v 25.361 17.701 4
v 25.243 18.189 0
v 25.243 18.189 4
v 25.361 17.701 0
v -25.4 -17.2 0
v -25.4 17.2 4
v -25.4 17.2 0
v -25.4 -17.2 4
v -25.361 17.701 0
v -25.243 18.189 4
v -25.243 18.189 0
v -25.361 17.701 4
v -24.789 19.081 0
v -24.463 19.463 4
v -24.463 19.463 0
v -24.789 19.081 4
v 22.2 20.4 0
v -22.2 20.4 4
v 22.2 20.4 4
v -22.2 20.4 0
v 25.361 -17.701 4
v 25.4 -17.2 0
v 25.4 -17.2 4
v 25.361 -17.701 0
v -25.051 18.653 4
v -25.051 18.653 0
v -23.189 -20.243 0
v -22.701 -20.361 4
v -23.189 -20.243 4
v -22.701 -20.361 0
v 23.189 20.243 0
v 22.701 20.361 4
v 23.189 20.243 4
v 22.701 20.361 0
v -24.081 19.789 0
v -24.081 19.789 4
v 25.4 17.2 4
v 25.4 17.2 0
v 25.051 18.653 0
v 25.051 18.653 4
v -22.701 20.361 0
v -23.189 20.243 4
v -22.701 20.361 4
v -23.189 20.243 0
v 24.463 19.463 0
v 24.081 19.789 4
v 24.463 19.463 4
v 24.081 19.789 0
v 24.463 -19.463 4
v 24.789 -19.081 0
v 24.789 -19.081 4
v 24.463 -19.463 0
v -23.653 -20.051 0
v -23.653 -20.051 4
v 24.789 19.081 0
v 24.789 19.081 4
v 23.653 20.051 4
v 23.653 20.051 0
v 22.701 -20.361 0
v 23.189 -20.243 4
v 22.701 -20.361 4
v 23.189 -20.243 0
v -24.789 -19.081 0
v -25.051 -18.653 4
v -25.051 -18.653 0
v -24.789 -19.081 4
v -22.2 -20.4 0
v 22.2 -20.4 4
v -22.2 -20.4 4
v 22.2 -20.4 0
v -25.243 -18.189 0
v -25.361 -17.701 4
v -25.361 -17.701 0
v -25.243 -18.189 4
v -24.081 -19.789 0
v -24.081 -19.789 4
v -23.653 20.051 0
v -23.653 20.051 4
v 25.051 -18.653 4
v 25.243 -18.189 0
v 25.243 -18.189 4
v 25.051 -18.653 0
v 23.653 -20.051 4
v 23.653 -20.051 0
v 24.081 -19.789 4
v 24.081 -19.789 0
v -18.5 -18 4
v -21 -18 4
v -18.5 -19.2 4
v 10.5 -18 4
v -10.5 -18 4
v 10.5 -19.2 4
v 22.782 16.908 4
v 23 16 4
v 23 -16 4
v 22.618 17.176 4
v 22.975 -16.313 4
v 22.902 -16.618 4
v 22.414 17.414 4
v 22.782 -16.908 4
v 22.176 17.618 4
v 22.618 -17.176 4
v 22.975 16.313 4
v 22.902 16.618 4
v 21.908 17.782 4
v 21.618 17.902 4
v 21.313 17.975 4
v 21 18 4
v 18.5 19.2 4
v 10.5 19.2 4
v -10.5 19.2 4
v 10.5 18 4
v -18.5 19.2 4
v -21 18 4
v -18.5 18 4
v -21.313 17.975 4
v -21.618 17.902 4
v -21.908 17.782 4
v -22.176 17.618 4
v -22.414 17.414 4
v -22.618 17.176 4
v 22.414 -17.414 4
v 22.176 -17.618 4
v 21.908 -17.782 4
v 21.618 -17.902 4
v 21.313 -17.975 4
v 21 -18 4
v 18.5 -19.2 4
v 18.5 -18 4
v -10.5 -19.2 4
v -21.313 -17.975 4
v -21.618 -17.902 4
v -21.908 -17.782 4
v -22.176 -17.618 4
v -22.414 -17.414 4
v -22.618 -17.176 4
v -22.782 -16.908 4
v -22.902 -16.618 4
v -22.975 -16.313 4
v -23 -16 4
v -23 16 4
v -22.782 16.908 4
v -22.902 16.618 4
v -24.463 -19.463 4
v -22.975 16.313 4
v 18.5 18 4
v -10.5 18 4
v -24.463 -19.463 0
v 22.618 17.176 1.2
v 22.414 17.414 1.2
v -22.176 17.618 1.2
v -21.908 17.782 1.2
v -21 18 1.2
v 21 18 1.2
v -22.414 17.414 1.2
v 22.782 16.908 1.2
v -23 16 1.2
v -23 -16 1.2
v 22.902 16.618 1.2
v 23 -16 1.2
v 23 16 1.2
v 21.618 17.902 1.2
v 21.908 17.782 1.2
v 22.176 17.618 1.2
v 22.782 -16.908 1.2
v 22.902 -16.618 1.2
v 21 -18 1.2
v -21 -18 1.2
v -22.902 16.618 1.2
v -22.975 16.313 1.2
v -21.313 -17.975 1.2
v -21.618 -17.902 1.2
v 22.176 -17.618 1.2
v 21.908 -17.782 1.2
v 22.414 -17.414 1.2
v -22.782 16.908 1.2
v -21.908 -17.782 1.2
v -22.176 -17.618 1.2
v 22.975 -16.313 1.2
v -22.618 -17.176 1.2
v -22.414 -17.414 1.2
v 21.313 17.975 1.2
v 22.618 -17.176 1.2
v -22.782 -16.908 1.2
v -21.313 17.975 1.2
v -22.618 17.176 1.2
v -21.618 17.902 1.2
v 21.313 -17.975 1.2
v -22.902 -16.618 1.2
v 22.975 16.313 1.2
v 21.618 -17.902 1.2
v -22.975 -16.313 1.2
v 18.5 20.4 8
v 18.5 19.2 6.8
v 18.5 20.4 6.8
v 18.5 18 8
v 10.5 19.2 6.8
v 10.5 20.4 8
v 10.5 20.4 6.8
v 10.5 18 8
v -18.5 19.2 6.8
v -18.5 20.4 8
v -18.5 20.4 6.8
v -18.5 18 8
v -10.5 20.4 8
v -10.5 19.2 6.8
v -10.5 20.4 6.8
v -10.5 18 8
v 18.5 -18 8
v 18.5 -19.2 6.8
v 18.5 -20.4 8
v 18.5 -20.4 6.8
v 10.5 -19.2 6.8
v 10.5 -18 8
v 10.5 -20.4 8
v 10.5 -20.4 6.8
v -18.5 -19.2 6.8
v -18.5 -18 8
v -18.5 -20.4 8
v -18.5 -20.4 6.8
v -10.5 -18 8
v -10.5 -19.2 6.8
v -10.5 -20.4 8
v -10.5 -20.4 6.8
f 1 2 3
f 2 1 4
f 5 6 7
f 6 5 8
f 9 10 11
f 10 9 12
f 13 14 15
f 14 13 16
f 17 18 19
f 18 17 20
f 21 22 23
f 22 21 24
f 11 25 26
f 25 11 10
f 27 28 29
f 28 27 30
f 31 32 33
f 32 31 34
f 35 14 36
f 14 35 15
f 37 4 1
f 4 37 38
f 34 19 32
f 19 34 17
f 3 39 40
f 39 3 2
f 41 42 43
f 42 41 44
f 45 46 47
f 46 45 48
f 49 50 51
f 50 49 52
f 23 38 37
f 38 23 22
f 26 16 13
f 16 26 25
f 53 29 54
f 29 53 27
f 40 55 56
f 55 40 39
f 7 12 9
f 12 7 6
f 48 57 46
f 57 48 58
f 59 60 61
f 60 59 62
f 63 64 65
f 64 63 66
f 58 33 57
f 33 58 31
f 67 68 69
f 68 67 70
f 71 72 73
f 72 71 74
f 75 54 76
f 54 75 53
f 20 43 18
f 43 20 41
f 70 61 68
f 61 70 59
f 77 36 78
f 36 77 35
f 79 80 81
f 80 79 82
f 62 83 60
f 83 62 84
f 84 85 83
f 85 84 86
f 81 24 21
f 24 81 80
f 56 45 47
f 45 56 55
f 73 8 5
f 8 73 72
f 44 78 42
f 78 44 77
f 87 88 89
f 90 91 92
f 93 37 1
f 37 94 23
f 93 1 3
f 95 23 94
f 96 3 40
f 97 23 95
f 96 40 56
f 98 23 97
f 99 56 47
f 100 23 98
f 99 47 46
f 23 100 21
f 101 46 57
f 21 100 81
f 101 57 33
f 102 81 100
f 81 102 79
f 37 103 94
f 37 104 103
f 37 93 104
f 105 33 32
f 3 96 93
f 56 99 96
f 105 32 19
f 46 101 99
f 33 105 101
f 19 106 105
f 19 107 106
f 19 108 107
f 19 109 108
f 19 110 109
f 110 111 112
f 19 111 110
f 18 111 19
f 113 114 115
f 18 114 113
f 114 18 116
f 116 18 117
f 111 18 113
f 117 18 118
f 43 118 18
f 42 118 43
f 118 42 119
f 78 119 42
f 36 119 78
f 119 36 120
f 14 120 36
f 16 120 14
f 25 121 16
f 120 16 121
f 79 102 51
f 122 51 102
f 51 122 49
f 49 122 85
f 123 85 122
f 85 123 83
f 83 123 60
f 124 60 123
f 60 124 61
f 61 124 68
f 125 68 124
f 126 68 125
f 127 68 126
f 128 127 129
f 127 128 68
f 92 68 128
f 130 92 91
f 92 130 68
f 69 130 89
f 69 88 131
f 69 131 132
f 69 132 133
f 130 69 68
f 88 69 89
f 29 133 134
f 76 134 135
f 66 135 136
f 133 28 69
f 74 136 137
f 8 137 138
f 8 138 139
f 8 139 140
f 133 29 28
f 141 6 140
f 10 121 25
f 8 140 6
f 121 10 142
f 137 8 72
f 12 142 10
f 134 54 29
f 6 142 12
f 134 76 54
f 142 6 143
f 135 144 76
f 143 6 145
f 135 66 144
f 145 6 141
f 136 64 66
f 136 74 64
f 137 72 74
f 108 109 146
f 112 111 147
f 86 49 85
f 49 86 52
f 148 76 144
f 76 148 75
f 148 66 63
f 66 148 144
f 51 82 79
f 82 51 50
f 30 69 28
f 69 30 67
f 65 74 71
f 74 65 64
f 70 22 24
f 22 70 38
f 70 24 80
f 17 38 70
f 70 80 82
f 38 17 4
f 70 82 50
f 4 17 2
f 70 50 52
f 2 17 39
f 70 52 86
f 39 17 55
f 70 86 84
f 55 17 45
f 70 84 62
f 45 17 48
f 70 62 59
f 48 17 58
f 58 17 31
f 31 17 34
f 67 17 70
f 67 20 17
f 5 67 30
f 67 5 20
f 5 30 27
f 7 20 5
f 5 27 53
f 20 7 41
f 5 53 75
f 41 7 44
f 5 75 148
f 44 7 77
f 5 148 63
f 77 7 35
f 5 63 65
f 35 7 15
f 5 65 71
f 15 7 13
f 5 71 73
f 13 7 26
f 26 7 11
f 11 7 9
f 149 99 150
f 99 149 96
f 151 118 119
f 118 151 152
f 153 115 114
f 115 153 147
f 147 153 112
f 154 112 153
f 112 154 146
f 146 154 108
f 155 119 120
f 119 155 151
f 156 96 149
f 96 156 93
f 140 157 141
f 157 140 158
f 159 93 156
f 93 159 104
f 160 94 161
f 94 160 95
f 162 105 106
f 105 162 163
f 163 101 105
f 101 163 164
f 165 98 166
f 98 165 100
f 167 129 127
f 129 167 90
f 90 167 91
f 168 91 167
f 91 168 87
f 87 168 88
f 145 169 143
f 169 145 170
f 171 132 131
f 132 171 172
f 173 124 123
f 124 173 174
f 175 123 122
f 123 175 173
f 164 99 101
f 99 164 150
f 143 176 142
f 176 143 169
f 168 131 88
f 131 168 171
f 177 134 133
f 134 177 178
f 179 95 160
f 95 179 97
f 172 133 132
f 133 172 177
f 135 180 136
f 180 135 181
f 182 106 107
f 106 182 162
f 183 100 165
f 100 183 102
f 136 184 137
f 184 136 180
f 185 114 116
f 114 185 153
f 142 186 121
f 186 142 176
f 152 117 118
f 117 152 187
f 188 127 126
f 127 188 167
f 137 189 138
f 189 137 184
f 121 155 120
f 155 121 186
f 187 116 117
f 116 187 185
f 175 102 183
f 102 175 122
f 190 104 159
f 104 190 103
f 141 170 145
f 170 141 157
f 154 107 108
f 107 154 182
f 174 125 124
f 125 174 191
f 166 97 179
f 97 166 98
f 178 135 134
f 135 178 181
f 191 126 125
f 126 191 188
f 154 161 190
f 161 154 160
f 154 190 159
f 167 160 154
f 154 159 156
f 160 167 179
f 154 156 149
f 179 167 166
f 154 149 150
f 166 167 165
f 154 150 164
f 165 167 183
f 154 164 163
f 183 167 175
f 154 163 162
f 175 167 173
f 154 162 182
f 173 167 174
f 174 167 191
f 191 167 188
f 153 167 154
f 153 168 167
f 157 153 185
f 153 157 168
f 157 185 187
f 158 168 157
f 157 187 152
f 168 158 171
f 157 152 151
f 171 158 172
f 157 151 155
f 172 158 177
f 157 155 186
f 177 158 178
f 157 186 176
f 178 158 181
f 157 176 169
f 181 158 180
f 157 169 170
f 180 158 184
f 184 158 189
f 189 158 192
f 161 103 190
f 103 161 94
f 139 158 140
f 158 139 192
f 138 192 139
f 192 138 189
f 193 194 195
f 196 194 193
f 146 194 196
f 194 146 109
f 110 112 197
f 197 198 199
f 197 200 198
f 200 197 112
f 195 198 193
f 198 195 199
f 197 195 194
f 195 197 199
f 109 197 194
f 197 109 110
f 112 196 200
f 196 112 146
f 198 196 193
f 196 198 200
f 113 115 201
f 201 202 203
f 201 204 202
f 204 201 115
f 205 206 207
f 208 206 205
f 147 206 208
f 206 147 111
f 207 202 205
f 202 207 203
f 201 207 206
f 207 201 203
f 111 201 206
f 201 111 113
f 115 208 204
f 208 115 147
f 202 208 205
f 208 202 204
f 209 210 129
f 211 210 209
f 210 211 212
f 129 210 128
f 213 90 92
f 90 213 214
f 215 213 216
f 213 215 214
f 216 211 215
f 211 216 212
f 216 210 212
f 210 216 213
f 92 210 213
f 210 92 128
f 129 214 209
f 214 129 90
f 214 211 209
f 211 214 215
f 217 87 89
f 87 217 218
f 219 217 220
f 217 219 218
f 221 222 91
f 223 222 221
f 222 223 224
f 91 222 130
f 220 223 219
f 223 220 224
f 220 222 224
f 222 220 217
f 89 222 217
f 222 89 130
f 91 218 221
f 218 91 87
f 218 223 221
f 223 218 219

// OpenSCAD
$fn=40;
module shell(dw,dl,h) {
    l = dl/2;
    w = dw/2;
    ol = l+th;
    ow = w+th;
    difference() {
        hull() {
            translate([-ow,-ol,0]) cylinder(h,o_fil,o_fil);
            translate([-ow,ol,0]) cylinder(h,o_fil,o_fil);
            translate([ow,-ol,0]) cylinder(h,o_fil,o_fil);
            translate([ow,ol,0]) cylinder(h,o_fil,o_fil);
        }
        hull() {
            translate([-w,-l,th]) cylinder(h-th,r=i_fil);
            translate([-w,l,th]) cylinder(h-th,r=i_fil);
            translate([w,-l,th]) cylinder(h-th,r=i_fil);
            translate([w,l,th]) cylinder(h-th,r=i_fil);
        }
    }
}

module snapfit() {
    snap_w = 8;
    snap_h = 4;
    translate([int_length/4+snap_w,int_width/2+i_fil,height]) rotate([0,270,0]) linear_extrude(height=snap_w) polygon([[0,0],[snap_h,0],[snap_h,th*2],[0.7*snap_h,th*2],[0.7*snap_h,th],[0,th]]);
}

module snapfit_side() {
    snapfit();
    mirror([1,0,0]) snapfit();
}

int_length = 42;
int_width = 32;
th = 1.2;
i_fil = 2; //internal fillet radius
o_fil = i_fil + th;
height = 4;

shell(int_length,int_width,height);

stub_ht = 4.2;
snapfit_side();
mirror([0,1,0]) snapfit_side();
